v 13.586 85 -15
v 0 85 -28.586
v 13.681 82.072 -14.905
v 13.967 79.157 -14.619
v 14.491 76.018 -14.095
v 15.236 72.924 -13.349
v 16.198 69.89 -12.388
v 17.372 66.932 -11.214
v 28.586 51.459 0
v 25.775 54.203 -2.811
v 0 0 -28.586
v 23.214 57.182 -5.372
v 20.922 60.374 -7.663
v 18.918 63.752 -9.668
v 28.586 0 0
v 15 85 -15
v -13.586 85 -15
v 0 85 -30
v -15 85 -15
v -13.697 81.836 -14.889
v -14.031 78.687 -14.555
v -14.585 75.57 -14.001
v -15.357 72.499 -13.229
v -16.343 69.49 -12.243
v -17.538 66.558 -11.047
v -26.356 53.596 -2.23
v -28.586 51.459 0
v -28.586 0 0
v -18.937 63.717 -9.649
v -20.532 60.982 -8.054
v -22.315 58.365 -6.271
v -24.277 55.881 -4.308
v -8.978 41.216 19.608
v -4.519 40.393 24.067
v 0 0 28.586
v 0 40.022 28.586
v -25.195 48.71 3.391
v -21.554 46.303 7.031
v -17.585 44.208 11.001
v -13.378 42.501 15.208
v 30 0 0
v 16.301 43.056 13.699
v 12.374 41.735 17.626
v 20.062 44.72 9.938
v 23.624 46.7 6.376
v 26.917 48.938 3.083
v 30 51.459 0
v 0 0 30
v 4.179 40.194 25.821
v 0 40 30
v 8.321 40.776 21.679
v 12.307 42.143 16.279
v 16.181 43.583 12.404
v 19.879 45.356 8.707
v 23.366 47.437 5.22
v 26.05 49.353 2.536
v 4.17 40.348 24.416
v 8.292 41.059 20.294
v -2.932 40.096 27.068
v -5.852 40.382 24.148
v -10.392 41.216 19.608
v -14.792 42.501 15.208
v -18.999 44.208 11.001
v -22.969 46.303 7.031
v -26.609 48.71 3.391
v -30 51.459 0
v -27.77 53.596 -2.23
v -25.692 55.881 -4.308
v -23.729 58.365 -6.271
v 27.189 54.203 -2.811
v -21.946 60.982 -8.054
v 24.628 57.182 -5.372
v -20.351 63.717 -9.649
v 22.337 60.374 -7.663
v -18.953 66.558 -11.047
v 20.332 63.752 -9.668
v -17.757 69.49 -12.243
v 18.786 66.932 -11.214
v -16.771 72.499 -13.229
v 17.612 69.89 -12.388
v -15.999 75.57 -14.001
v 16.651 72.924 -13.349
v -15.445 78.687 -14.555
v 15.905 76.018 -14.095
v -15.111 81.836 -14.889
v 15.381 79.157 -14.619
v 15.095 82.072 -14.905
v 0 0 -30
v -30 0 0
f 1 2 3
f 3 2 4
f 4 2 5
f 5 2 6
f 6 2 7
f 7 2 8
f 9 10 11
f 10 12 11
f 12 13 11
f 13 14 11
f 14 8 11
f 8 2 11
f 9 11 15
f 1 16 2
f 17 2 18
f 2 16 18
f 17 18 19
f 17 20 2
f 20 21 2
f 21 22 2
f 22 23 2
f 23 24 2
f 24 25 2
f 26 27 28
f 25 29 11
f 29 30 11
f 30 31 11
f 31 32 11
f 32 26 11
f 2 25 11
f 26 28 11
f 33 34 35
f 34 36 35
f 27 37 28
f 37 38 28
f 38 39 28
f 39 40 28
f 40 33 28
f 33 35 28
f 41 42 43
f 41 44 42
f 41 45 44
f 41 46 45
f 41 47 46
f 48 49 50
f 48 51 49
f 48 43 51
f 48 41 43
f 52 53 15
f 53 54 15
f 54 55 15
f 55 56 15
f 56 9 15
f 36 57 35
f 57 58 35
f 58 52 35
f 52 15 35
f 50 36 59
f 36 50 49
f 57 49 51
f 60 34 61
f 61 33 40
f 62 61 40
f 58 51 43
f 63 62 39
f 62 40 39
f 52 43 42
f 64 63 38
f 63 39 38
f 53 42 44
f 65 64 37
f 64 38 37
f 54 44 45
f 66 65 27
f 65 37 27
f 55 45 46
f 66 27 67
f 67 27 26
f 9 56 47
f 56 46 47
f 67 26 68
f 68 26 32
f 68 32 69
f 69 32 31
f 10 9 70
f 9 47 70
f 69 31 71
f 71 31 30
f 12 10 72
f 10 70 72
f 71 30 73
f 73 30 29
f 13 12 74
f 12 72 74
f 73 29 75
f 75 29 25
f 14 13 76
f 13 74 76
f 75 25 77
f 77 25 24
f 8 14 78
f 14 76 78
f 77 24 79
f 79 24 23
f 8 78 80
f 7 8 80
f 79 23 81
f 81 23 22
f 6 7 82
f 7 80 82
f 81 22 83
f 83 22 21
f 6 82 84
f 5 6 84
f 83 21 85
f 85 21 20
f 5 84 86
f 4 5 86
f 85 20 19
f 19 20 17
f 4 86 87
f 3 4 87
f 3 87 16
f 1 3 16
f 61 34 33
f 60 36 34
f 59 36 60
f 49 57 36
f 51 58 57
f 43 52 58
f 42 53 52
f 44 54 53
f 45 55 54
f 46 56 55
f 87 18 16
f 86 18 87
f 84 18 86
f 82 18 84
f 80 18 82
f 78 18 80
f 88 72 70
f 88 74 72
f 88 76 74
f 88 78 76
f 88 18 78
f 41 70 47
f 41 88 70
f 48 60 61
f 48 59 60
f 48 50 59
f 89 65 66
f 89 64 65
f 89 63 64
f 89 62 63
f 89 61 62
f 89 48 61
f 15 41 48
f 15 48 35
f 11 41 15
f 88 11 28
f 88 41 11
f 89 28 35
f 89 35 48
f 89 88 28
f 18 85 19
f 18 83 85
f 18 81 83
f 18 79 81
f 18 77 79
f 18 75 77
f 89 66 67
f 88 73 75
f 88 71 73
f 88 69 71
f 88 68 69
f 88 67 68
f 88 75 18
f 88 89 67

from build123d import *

# Parameters (mm, degrees)
EXTRUDE1_DEPTH     = 85
SHELL1_T           = -1
SKETCH3_R          = 45
CUT_EXTRUDE1_DEPTH = 30


with BuildPart() as part:
    # Sketch1 → Extrude1 (new body)
    with BuildSketch(Plane(origin=(0, 0, 0), x_dir=(1, 0, 0), z_dir=(0, 1, 0))):
        Polygon((0, 30), (30, 0), (0, -30), (-30, 0), align=None)
    extrude(amount=EXTRUDE1_DEPTH)

    # Shell1
    shell1_openings = [part.faces().sort_by_distance(p)[0] for p in [
        (0, 85, 0),
        (0, 0, 0),
    ]]
    offset(amount=SHELL1_T, openings=shell1_openings, kind=Kind.INTERSECTION)

    # Sketch3 → Cut-Extrude1 (cut, symmetric)
    with BuildSketch(Plane(origin=(0, 0, 0), x_dir=(0, 0, -1), z_dir=(1, 0, 0))):
        with Locations((-30, 85)):
            Circle(SKETCH3_R)
    extrude(amount=CUT_EXTRUDE1_DEPTH, both=True, mode=Mode.SUBTRACT)


solid = part.part
